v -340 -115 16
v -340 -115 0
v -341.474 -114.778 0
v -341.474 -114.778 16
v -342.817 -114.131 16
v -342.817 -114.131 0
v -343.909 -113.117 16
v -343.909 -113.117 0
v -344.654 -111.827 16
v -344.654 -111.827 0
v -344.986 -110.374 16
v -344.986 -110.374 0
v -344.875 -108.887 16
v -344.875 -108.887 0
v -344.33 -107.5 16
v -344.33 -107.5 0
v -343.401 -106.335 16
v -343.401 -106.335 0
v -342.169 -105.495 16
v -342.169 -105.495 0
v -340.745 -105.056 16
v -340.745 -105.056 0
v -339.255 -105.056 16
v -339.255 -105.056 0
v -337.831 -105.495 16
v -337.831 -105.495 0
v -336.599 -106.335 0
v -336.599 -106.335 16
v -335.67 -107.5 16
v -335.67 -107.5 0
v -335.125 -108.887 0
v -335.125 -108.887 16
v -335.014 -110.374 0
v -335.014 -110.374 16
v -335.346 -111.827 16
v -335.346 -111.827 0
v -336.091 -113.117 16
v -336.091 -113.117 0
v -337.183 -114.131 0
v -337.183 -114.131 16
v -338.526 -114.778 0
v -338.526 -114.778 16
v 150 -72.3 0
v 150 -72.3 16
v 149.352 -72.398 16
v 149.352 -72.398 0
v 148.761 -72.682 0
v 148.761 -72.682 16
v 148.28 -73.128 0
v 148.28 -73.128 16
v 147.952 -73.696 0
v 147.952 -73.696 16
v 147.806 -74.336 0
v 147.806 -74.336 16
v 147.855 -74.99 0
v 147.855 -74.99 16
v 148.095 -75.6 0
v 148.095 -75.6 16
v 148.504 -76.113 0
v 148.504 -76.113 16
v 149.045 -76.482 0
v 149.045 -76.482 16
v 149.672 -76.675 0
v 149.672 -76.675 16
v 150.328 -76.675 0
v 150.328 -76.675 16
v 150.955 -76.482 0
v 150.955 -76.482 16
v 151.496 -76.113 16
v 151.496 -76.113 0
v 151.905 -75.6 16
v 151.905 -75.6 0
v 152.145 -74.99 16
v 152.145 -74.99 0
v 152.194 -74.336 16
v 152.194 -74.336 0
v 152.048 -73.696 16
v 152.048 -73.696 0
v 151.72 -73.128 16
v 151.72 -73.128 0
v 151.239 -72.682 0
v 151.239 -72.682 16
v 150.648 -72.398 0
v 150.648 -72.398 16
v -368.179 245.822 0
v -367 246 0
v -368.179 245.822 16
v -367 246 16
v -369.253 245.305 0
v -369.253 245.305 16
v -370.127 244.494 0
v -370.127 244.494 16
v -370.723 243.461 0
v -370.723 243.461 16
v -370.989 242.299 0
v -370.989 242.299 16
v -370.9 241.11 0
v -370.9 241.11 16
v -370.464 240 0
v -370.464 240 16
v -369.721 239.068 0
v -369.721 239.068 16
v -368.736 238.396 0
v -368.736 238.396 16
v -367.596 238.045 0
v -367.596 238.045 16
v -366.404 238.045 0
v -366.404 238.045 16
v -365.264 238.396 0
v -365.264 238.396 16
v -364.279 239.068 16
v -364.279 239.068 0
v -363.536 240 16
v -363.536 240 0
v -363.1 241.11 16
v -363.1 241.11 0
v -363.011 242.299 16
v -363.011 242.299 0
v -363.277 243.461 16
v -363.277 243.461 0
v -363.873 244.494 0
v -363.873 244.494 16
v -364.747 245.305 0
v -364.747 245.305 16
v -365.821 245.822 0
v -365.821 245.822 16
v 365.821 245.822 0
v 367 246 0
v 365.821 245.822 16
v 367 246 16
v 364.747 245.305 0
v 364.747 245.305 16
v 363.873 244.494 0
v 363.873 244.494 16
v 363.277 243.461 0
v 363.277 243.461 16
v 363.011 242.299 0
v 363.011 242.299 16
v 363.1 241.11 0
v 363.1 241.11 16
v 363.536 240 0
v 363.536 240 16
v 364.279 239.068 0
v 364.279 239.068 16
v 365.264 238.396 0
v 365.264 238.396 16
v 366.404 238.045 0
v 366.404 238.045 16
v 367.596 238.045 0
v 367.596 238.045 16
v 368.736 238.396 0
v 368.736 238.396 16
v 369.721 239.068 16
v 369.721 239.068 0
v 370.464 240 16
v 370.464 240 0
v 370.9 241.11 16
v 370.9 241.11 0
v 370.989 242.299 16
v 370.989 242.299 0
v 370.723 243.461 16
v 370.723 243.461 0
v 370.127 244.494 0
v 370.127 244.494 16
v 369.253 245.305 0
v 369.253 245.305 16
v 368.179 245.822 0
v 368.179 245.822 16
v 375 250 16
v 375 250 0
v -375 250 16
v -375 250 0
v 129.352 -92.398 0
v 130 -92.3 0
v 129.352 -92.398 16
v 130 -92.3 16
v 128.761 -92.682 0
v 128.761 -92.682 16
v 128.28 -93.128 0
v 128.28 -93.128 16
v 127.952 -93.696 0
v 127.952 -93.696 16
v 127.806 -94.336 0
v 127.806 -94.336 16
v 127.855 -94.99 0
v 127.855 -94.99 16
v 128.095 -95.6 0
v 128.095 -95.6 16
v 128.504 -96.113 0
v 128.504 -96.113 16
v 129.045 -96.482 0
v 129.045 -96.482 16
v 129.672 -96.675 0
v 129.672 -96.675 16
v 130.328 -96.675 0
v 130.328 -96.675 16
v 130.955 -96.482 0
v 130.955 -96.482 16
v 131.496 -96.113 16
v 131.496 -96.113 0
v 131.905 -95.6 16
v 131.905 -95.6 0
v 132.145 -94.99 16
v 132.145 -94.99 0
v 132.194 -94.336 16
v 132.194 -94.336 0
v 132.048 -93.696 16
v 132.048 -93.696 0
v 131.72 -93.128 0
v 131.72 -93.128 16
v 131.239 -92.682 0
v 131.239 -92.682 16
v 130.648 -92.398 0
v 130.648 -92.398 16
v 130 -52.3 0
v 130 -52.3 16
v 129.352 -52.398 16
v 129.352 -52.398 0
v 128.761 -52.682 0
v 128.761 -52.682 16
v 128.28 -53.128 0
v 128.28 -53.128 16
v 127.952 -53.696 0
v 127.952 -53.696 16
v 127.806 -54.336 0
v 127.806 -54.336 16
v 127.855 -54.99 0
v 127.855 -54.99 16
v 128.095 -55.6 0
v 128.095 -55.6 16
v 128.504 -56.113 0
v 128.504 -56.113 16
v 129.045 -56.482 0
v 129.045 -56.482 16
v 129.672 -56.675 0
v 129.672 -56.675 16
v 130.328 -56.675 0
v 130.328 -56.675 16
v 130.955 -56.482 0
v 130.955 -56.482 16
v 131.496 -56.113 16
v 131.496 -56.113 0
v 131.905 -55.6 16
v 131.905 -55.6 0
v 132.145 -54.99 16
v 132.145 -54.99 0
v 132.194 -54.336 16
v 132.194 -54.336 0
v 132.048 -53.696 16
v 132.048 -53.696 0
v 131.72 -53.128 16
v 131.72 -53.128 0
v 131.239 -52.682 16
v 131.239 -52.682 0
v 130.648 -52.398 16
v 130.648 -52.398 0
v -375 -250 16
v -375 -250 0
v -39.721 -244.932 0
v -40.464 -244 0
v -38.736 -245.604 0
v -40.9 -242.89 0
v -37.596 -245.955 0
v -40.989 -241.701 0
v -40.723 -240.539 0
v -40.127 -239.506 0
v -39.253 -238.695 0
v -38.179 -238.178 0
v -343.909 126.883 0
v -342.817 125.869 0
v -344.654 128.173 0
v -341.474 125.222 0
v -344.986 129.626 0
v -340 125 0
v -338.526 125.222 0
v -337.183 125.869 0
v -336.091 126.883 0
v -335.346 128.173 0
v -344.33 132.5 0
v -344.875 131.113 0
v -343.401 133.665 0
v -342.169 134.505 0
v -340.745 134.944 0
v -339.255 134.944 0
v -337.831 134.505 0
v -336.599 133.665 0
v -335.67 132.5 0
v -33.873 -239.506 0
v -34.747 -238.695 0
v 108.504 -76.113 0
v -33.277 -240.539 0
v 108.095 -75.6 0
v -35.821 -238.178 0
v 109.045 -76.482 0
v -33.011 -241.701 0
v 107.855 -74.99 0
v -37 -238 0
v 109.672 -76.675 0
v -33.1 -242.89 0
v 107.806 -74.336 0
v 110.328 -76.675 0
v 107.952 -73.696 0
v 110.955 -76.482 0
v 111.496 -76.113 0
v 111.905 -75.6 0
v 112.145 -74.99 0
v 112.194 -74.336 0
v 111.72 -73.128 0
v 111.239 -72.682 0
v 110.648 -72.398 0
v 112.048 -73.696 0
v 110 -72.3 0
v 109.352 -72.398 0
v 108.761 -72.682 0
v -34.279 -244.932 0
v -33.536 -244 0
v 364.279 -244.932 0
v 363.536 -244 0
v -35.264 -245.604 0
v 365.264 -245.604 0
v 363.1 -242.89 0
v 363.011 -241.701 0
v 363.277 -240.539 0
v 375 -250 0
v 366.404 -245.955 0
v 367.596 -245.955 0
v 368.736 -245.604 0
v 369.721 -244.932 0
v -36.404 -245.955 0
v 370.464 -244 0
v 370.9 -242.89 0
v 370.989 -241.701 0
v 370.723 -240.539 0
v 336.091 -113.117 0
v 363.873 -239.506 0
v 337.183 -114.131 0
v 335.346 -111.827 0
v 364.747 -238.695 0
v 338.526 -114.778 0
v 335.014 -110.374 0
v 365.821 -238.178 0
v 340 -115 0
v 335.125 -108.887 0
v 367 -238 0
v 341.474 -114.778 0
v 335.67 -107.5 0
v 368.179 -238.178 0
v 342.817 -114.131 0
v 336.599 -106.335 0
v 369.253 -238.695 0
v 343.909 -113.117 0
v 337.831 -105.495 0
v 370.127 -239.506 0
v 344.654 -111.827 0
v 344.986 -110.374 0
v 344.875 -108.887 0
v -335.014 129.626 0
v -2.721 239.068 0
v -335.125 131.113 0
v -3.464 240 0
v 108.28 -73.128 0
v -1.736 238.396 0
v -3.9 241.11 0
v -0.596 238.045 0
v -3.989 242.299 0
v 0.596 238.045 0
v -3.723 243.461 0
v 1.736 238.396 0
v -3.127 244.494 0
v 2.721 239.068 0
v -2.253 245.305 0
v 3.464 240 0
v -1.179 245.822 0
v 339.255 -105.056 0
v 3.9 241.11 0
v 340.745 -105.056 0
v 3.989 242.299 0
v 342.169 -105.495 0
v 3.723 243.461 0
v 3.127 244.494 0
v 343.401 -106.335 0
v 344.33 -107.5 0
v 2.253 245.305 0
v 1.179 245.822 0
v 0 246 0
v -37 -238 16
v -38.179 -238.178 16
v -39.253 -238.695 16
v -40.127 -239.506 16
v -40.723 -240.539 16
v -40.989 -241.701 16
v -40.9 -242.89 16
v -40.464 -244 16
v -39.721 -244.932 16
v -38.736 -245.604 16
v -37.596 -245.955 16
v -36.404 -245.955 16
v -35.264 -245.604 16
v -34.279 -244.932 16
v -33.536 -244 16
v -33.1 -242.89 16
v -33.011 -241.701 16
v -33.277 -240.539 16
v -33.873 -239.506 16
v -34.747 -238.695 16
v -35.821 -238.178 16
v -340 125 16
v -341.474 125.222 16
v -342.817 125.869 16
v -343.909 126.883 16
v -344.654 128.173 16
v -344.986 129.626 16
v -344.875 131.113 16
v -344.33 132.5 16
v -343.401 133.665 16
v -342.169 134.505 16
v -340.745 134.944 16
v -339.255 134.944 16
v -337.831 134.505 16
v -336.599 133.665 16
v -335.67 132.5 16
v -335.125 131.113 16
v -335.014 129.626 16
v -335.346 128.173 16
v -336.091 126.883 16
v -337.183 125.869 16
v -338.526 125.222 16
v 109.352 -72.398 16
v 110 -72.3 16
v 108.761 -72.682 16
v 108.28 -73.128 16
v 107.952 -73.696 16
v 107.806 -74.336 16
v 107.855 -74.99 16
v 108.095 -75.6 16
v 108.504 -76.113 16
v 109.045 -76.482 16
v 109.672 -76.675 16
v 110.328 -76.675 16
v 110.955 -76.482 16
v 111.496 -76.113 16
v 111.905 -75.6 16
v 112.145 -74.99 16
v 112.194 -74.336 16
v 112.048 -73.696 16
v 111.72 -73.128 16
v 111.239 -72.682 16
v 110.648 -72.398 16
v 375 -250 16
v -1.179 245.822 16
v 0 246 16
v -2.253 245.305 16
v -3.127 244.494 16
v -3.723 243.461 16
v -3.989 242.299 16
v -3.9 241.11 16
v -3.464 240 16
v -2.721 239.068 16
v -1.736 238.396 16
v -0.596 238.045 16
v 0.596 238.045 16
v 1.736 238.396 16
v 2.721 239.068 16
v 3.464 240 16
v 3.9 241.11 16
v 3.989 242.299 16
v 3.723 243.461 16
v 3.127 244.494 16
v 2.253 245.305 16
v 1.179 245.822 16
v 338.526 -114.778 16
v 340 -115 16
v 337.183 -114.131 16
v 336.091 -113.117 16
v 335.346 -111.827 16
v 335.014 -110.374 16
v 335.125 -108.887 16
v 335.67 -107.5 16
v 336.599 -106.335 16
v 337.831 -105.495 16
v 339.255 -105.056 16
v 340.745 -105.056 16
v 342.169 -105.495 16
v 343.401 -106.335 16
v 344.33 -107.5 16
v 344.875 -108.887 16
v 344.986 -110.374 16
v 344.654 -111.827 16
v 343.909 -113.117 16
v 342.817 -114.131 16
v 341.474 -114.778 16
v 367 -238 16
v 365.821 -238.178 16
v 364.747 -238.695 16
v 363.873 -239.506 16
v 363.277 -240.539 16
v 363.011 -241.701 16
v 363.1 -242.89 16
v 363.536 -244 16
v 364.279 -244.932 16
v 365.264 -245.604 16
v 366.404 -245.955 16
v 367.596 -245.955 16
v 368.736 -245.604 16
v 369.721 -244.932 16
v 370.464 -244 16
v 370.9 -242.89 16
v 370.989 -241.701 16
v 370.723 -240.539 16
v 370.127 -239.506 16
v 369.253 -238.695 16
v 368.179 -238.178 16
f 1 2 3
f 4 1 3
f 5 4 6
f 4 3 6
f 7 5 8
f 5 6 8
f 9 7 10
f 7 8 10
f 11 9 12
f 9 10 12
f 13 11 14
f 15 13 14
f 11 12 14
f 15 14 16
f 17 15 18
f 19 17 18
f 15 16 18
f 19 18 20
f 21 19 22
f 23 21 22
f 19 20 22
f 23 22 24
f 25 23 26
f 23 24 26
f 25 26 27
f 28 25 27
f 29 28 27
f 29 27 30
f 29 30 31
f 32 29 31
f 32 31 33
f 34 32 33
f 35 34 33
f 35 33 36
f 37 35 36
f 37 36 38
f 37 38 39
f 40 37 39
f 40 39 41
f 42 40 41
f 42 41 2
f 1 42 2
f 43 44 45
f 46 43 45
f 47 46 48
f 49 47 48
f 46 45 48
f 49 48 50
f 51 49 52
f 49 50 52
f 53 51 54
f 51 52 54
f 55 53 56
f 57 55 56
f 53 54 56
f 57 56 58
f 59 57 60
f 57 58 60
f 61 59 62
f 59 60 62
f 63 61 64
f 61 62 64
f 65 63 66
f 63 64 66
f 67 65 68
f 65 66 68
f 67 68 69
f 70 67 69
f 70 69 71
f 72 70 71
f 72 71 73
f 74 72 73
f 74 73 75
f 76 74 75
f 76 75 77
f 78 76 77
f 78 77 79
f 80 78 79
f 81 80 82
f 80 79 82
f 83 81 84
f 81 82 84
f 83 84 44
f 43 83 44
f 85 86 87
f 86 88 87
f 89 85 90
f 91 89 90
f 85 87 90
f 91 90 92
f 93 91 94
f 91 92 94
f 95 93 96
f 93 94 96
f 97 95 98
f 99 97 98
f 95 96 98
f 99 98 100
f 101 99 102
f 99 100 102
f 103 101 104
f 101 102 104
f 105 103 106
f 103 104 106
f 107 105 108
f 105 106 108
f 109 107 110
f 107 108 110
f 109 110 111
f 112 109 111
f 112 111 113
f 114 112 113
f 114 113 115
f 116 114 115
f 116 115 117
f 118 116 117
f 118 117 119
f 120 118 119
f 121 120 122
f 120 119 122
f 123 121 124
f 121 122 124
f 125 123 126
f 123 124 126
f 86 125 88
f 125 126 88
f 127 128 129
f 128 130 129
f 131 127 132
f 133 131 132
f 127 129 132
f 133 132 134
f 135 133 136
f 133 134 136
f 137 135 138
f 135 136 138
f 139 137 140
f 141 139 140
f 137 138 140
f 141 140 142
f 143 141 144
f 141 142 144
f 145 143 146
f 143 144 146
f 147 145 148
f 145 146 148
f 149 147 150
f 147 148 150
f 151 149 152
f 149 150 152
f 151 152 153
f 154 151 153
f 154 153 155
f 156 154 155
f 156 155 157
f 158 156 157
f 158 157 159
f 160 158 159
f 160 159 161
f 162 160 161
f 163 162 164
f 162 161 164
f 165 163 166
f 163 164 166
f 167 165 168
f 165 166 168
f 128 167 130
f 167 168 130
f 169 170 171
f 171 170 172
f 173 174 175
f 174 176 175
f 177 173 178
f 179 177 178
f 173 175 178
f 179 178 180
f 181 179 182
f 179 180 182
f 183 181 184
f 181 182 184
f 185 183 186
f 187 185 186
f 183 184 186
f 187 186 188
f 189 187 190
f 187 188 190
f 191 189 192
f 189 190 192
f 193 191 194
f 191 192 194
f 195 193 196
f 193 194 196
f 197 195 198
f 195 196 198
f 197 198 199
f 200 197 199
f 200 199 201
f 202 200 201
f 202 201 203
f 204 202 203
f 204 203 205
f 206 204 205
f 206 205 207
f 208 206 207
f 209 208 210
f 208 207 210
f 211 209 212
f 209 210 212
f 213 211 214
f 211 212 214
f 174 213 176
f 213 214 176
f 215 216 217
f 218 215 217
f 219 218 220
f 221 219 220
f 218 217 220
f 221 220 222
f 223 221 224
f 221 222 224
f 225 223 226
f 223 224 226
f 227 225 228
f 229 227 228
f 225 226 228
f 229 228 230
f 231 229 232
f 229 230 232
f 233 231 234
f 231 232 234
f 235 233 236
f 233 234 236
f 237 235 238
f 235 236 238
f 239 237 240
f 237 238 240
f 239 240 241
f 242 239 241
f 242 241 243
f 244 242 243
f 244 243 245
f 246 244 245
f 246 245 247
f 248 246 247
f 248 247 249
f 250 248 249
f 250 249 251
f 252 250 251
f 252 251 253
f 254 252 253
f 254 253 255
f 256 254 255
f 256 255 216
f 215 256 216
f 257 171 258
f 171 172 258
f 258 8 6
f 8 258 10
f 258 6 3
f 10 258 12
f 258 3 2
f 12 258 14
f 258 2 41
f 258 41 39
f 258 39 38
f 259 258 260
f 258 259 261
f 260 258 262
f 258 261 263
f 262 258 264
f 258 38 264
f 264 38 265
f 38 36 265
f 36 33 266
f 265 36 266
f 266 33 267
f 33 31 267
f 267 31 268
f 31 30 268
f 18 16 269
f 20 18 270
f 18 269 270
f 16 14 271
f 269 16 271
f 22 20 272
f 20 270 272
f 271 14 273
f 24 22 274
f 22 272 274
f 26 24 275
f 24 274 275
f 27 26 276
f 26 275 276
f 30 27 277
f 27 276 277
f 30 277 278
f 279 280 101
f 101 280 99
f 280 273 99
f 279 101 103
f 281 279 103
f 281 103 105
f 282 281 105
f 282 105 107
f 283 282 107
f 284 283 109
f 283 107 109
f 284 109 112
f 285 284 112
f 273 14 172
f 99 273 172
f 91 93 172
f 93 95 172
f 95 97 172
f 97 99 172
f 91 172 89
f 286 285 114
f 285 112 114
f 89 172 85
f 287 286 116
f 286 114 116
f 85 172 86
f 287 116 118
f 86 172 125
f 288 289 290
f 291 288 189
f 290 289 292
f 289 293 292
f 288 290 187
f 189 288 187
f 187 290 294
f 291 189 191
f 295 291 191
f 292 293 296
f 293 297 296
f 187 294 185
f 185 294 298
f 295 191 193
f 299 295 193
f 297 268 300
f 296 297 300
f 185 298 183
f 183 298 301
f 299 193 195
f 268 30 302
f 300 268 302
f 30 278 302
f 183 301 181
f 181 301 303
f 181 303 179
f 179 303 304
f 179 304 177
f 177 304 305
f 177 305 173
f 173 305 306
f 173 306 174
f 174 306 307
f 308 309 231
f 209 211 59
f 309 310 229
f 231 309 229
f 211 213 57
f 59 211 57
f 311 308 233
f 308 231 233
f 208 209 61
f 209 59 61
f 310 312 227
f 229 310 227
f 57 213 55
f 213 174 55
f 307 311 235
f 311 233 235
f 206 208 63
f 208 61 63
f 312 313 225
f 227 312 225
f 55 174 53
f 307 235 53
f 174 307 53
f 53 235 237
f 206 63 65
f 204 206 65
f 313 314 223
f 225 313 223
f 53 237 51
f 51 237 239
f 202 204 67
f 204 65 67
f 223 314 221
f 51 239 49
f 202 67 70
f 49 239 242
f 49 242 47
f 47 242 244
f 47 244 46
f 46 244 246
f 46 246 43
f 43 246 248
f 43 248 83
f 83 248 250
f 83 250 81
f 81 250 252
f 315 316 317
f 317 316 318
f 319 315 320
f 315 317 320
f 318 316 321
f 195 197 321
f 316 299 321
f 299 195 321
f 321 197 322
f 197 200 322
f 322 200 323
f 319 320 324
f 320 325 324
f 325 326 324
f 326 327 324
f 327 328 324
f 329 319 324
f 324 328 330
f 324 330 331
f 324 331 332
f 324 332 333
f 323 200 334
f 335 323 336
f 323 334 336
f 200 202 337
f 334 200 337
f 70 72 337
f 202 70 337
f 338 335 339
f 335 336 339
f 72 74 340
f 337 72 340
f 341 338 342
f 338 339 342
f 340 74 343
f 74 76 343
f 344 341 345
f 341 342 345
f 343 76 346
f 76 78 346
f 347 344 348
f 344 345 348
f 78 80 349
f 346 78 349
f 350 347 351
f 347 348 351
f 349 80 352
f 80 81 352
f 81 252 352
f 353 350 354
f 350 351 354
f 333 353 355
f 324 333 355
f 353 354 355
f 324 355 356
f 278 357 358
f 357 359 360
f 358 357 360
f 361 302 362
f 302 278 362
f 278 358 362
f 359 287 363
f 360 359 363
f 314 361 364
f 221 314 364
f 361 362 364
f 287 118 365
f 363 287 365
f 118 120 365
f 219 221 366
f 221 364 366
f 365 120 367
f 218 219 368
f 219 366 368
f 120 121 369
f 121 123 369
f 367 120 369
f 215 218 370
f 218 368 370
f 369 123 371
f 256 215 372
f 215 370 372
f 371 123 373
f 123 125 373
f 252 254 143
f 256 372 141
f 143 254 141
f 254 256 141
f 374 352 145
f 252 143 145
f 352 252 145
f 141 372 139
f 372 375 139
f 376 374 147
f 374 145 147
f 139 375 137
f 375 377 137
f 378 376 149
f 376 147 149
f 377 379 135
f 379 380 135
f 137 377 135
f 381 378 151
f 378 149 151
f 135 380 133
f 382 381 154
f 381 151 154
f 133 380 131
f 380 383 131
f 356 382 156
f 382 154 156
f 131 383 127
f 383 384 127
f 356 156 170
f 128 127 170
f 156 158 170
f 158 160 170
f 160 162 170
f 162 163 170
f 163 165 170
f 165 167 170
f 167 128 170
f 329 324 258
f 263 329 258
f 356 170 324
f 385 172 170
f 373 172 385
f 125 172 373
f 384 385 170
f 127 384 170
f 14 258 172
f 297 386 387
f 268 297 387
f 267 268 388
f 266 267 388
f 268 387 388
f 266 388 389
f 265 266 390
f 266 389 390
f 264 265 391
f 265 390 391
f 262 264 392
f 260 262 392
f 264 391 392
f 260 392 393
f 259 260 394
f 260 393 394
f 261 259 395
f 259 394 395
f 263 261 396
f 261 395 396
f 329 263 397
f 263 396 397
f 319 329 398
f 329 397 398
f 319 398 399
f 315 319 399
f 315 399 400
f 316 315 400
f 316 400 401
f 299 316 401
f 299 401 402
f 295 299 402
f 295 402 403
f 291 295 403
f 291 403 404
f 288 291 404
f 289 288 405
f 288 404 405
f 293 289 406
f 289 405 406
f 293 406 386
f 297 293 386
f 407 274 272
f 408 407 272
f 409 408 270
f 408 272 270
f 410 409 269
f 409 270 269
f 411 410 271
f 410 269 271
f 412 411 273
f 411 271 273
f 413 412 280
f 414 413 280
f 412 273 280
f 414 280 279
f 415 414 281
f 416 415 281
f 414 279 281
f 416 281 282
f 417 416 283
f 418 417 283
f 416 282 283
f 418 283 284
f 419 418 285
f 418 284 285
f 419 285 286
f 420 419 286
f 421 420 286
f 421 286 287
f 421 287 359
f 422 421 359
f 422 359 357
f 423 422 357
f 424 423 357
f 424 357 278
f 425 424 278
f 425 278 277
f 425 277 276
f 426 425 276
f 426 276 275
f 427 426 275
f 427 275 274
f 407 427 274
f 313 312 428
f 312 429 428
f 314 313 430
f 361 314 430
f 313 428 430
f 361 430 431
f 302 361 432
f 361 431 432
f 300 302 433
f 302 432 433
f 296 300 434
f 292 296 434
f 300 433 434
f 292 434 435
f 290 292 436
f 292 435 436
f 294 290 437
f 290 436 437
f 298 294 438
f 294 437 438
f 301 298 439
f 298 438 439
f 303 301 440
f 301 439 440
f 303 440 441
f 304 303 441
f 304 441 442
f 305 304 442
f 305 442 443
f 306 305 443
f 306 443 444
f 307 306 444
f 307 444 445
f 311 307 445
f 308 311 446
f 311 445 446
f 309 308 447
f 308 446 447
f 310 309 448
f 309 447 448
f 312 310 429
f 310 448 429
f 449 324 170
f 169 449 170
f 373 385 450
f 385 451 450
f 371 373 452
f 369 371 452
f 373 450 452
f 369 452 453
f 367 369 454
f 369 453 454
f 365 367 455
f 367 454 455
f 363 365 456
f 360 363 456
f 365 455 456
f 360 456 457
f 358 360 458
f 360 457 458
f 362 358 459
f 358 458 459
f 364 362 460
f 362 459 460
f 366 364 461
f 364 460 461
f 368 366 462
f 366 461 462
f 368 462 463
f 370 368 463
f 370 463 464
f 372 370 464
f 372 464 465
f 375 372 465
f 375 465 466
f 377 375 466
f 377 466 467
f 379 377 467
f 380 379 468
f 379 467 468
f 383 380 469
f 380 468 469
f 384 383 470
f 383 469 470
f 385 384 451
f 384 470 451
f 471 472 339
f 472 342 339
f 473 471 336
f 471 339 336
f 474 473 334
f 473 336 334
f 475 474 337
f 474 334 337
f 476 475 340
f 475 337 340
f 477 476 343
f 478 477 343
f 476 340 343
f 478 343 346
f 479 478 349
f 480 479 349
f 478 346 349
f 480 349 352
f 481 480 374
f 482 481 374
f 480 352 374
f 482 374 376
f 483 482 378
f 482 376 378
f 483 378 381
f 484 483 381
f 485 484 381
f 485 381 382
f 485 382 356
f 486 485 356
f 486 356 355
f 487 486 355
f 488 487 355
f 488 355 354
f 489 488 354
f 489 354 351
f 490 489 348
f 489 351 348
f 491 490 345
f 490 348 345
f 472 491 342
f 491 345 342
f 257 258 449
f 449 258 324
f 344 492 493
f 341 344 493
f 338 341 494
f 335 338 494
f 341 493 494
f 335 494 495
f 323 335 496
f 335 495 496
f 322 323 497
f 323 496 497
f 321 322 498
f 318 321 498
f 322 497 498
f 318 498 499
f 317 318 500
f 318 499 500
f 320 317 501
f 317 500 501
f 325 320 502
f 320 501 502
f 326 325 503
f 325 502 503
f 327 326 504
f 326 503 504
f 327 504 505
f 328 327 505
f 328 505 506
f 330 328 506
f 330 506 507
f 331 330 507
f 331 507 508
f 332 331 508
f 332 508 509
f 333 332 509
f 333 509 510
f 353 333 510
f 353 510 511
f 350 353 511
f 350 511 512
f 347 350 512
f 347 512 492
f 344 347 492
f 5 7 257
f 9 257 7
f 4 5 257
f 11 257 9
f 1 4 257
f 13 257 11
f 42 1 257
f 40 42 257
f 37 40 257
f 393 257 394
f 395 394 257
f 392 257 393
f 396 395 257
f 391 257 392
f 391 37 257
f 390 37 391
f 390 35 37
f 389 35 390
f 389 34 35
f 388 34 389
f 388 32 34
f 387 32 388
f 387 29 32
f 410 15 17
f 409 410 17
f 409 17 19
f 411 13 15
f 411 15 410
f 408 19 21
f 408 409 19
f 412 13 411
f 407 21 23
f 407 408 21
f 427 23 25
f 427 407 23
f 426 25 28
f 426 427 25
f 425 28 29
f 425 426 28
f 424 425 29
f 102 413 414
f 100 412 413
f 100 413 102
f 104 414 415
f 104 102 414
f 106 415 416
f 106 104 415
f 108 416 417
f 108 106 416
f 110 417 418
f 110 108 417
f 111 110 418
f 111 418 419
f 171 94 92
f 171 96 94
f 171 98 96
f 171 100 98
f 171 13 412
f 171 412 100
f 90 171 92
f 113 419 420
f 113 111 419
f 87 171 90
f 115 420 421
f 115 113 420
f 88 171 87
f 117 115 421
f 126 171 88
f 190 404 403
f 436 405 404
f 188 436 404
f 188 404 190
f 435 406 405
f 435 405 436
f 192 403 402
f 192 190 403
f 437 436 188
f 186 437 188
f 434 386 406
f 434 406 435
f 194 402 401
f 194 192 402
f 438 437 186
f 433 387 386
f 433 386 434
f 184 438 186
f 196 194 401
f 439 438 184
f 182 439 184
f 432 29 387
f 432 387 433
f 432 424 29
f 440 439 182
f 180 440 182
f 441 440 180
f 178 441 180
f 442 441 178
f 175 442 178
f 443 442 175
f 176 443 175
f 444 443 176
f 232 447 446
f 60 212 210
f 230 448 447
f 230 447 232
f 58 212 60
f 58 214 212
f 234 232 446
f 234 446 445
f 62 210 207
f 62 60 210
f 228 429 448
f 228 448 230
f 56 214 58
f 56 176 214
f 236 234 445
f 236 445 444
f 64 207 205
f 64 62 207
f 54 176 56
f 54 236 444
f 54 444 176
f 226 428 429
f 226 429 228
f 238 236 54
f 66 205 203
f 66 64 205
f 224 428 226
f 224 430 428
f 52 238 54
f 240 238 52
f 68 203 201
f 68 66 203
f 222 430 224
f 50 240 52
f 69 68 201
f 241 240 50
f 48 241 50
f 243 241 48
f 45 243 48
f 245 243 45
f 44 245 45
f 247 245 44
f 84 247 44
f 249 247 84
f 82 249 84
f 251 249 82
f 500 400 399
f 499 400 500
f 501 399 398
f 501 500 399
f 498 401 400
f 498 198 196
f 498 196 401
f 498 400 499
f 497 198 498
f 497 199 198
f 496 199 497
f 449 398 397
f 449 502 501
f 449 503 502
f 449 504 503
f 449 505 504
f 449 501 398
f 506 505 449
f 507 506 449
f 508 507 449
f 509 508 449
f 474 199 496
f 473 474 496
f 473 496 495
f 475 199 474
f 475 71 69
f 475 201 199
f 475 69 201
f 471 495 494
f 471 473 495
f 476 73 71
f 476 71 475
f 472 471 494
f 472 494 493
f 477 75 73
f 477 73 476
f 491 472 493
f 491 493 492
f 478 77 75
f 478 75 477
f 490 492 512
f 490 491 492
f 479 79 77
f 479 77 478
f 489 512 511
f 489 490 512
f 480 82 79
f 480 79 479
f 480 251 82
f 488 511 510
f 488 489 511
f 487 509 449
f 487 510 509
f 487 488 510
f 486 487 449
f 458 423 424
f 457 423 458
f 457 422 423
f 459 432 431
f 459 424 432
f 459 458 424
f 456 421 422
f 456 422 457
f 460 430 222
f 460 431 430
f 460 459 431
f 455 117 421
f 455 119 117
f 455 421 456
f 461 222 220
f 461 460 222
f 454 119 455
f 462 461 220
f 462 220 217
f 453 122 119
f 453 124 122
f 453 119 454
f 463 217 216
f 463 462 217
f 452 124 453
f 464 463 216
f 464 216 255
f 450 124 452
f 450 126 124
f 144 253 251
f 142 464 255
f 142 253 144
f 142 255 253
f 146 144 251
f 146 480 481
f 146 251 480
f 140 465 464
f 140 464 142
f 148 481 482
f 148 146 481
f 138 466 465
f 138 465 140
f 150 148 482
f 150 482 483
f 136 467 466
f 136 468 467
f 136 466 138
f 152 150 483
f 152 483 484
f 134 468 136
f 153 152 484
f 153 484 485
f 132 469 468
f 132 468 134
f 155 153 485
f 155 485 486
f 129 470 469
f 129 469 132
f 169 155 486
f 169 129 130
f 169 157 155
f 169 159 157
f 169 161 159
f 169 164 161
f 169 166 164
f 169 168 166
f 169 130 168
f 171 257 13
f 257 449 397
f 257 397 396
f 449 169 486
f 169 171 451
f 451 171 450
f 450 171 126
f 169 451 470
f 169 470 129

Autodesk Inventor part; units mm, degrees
ref_plane "YZ Plane" through (0, 0, 0) normal (1, 0, 0) x (0, 1, 0)
ref_plane "XZ Plane" through (0, 0, 0) normal (0, 1, 0) x (-1, 0, 0)
ref_plane "XY Plane" through (0, 0, 0) normal (0, 0, 1) x (1, 0, 0)
sketch "Skizze1" plane through (0, 0, 0) normal (0, 0, 1) x (1, 0, 0)
  line L0 (-375, -250) -> (375, -250)
  line L1 (375, -250) -> (375, 250)
  line L2 (375, 250) -> (-375, 250)
  line L3 (-375, 250) -> (-375, -250)
  line L4 (-375, -250) -> (375, 250) construction
  line L5 (375, -250) -> (-375, 250) construction
  point P0 (0, 0)
  dimension "d0" = 750
  dimension "d1" = 500
extrude "Extrusion1" add sketch "Skizze1" along normal blind 16
sketch "Skizze5" plane through (0, 0, 16) normal (0, 0, 1) x (1, 0, 0)
  line L0 (375, -250) -> (375, 250) projected
  line L1 (375, 250) -> (-375, 250) projected
  line L2 (-375, 250) -> (-375, -250) projected
  line L3 (-375, -250) -> (375, -250) projected
  point P0 (0, 0)
  point P1 (340, -110)
  point P2 (-340, -110)
  point P3 (-340, 130)
  dimension "d39" = 140
  dimension "d40" = 140
  dimension "d41" = 35
  dimension "d42" = 35
  dimension "d44" = 120
  dimension "d57" = 35
hole "Bohrung4" at (340, -110, 16) at (-340, -110, 16) at (-340, 130, 16) direction (0, 0, -1) diameter 10 end through all
sketch "Skizze9" plane through (0, 0, 0) normal (0, 0, -1) x (-1, 0, 0)
  line L0 (-375, -250) -> (-375, 250) projected
  line L1 (375, -250) -> (-375, -250) projected
  point P0 (0, 0)
  point P1 (-150, -74.5)
  point P2 (-130, -54.5)
  point P3 (-130, -94.5)
  point P4 (-110, -74.5)
  dimension "d101" = 40
  dimension "d102" = 40
  dimension "d103" = 20
  dimension "d104" = 20
  dimension "d105" = 175.5
  dimension "d106" = 245
hole "Bohrung8" at (150, -74.5, 0) at (130, -54.5, 0) at (130, -94.5, 0) at (110, -74.5, 0) direction (0, 0, 1) diameter 4.4 end through all
sketch "Skizze10" plane through (0, 0, 0) normal (0, 0, -1) x (-1, 0, 0)
  line L0 (-375, -250) -> (-375, 250) projected
  line L1 (375, -250) -> (-375, -250) projected
  line L2 (375, 250) -> (375, -250) projected
  line L3 (-375, 250) -> (375, 250) projected
  point P0 (0, 0)
  point P1 (-367, 242)
  point P2 (0, 242)
  point P3 (367, 242)
  point P4 (-367, -242)
  point P5 (37, -242)
  dimension "d114" = 8
  dimension "d115" = 8
  dimension "d116" = 8
  dimension "d118" = 8
  dimension "d128" = 338
hole "Bohrung9" at (367, 242, 0) at (0, 242, 0) at (-367, 242, 0) at (367, -242, 0) at (-37, -242, 0) direction (0, 0, 1) diameter 8 depth 20 tip angle 118
equation "\"d116\" = d114"
equation "\"d118\" = d115"
properties part number "Seite_links" material "Holz (Birke)"
